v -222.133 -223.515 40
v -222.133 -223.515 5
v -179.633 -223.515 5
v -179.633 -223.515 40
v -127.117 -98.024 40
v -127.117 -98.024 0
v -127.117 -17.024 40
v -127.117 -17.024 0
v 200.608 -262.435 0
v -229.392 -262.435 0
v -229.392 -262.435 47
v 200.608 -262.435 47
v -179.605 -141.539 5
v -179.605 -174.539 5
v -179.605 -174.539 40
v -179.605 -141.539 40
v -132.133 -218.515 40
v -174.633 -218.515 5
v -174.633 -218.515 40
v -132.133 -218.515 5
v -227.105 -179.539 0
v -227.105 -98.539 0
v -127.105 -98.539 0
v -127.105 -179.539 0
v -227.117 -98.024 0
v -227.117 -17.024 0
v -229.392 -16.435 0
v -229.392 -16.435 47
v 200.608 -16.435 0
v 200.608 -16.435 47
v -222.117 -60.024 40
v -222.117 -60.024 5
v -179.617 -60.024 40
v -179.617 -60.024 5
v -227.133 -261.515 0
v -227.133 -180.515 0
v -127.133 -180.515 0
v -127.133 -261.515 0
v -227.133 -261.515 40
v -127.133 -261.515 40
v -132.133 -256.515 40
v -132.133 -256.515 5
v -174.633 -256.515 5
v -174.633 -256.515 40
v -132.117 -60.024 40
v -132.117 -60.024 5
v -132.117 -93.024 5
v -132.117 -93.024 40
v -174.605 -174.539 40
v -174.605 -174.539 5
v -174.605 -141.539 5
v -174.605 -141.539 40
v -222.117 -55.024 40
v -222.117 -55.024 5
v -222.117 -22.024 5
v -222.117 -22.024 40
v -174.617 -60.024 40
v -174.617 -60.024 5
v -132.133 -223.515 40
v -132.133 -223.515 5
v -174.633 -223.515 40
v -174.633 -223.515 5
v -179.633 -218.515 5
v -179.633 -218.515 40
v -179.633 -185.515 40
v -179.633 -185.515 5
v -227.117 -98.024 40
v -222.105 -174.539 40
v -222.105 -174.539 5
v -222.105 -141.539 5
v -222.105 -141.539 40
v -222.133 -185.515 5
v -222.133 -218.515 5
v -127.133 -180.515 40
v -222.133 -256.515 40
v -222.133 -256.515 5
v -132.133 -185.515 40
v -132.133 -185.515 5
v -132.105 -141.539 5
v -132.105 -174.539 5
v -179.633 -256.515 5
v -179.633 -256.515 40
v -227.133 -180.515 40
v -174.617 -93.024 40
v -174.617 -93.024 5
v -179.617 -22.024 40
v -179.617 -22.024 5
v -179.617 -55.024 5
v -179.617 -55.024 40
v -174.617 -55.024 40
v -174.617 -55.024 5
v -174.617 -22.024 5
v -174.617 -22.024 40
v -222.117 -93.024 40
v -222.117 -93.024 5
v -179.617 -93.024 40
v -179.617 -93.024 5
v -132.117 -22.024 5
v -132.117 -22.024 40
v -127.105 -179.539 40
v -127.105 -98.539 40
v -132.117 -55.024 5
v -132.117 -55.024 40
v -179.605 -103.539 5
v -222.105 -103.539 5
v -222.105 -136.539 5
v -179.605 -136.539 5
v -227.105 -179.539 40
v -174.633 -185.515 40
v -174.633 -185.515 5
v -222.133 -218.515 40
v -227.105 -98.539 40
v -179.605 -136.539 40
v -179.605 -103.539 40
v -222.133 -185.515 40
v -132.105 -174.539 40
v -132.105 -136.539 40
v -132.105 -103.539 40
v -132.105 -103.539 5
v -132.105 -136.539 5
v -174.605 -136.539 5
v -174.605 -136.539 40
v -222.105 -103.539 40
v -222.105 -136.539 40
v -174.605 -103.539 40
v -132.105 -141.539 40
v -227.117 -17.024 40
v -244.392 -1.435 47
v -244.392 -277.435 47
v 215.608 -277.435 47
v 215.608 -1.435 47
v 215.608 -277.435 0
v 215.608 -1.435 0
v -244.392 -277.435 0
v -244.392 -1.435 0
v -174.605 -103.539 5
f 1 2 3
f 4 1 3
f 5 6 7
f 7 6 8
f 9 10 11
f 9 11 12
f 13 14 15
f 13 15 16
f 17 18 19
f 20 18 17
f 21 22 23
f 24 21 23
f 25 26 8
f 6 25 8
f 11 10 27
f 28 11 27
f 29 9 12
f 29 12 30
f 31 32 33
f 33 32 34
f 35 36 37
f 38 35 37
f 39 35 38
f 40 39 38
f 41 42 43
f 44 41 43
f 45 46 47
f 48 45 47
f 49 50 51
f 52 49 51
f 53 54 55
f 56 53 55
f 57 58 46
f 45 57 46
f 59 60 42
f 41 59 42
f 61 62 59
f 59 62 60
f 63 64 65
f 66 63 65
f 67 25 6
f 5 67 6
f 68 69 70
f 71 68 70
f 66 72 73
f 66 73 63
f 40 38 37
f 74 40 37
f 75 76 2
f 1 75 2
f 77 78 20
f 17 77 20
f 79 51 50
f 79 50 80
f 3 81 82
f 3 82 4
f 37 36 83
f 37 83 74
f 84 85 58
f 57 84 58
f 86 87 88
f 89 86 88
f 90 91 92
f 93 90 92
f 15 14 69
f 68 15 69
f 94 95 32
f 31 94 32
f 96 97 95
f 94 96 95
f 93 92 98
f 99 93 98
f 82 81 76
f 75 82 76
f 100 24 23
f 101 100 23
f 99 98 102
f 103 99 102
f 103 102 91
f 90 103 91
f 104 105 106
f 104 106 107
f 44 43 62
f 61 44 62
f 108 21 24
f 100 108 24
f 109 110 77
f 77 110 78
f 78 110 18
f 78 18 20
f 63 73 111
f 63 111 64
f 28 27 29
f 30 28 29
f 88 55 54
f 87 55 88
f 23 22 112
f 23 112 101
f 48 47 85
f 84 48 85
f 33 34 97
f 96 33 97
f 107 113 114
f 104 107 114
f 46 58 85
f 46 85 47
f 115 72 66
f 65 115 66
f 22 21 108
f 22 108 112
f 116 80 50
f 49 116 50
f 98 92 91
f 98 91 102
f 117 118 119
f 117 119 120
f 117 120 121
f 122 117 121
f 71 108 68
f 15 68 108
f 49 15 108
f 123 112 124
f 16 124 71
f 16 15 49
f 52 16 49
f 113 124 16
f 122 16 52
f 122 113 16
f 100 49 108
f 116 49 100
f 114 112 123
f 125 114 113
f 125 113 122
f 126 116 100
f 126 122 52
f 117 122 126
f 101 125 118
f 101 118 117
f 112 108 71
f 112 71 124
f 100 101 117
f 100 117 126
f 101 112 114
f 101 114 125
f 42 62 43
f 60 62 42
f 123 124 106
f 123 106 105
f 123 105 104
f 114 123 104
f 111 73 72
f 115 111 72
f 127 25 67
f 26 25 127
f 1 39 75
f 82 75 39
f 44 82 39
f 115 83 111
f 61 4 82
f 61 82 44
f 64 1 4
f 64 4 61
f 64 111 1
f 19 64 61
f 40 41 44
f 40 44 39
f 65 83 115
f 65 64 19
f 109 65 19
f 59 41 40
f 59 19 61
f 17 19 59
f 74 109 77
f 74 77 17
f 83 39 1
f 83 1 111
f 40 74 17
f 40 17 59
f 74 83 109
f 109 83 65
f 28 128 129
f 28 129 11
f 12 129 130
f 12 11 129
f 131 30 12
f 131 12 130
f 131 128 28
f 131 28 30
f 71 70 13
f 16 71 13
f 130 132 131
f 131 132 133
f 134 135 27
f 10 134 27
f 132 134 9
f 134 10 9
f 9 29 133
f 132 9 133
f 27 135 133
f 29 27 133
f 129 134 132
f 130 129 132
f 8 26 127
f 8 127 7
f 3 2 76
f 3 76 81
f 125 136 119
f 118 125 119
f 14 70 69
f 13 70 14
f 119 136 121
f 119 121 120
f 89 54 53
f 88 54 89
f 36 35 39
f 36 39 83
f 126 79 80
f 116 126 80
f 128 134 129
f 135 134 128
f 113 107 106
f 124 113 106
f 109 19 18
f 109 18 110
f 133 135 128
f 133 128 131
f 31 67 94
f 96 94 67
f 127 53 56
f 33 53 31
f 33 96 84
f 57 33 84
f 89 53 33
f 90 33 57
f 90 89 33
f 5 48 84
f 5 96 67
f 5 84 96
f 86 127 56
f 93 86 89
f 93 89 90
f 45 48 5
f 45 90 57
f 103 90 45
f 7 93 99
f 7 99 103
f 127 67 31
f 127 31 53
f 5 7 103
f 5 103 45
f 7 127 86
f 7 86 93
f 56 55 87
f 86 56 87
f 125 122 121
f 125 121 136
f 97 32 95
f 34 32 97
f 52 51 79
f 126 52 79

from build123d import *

# Parameters (mm, degrees)
F0_W      = 459.9999934435
F0_H      = 275.9999934435
F0_W_2    = 430
F0_H_2    = 246
F1_DEPTH  = 47
F2_W      = 100
F2_H      = 81
F2_W_2    = 42.5000048876
F2_H_2    = 5
F2_W_3    = 5
F2_H_3    = 33.0000048876
F3_DEPTH  = 40
F4_DEPTH  = 5
F5_W      = 100
F5_H      = 81
F5_W_2    = 42.5000048876
F5_H_2    = 5
F5_W_3    = 5
F5_H_3    = 33.0000048876
F7_DEPTH  = 40
F8_DEPTH  = 5
F6_W      = 100
F6_H      = 81
F6_W_2    = 42.5000048876
F6_H_2    = 5
F6_W_3    = 5
F6_H_3    = 33.0000048876
F9_DEPTH  = 40
F10_DEPTH = 5


with BuildPart() as f1:
    # F0 (on Top) → F1 (new body)
    with BuildSketch(Plane.XY):
        with Locations((-14.3922492862, -139.4351271806)):
            Rectangle(F0_W, F0_H)
        with Locations((-14.3922492862, -139.4351271806)):
            Rectangle(F0_W_2, F0_H_2, mode=Mode.SUBTRACT)
    extrude(amount=F1_DEPTH)


with BuildPart() as f3:
    # F2 (on Top) → F3 (new body)
    with BuildSketch(Plane.XY):
        with Locations((-177.133394298, -221.0147144079)):
            Rectangle(F2_W, F2_H)
        Polygon((-174.633394298, -185.5147095203), (-132.1333894105, -185.5147095203), (-132.1333894105, -218.5147144079), (-132.1333894105, -223.5147144079), (-132.1333894105, -256.5147192955), (-174.633394298, -256.5147192955), (-179.633394298, -256.5147192955), (-222.1333991856, -256.5147192955), (-222.1333991856, -223.5147144079), (-222.1333991856, -218.5147144079), (-222.1333991856, -185.5147095203), (-179.633394298, -185.5147095203), align=None, mode=Mode.SUBTRACT)
        with Locations((-200.8833967418, -221.0147144079)):
            Rectangle(F2_W_2, F2_H_2)
        with Locations((-153.3833918543, -221.0147144079)):
            Rectangle(F2_W_2, F2_H_2)
        with Locations((-177.133394298, -202.0147119641)):
            Rectangle(F2_W_3, F2_H_3)
        with Locations((-177.133394298, -240.0147168517)):
            Rectangle(F2_W_3, F2_H_3)
        with Locations((-177.133394298, -221.0147144079)):
            Rectangle(F2_W_3, F2_H_2)
    extrude(amount=F3_DEPTH)

    # F2 (on Top) → F4 (join)
    with BuildSketch(Plane.XY):
        with Locations((-153.3833918543, -202.0147119641)):
            Rectangle(F2_W_2, F2_H_3)
        with Locations((-153.3833918543, -240.0147168517)):
            Rectangle(F2_W_2, F2_H_3)
        with Locations((-200.8833967418, -240.0147168517)):
            Rectangle(F2_W_2, F2_H_3)
        with Locations((-200.8833967418, -202.0147119641)):
            Rectangle(F2_W_2, F2_H_3)
    extrude(amount=F4_DEPTH)


with BuildPart() as f7:
    # F5 (on face) → F7 (new body)
    with BuildSketch(Plane.XY):
        with Locations((-177.1052449942, -139.0392463207)):
            Rectangle(F5_W, F5_H)
        Polygon((-174.6052449942, -103.5392414331), (-132.1052401066, -103.5392414331), (-132.1052401066, -136.5392463207), (-132.1052401066, -141.5392463207), (-132.1052401066, -174.5392512083), (-174.6052449942, -174.5392512083), (-179.6052449942, -174.5392512083), (-222.1052498817, -174.5392512083), (-222.1052498817, -141.5392463207), (-222.1052498817, -136.5392463207), (-222.1052498817, -103.5392414331), (-179.6052449942, -103.5392414331), align=None, mode=Mode.SUBTRACT)
        with Locations((-200.855247438, -139.0392463207)):
            Rectangle(F5_W_2, F5_H_2)
        with Locations((-177.1052449942, -139.0392463207)):
            Rectangle(F5_W_3, F5_H_2)
        with Locations((-153.3552425504, -139.0392463207)):
            Rectangle(F5_W_2, F5_H_2)
        with Locations((-177.1052449942, -158.0392487645)):
            Rectangle(F5_W_3, F5_H_3)
        with Locations((-177.1052449942, -120.0392438769)):
            Rectangle(F5_W_3, F5_H_3)
    extrude(amount=F7_DEPTH)

    # F5 (on face) → F8 (join)
    with BuildSketch(Plane.XY):
        with Locations((-200.855247438, -120.0392438769)):
            Rectangle(F5_W_2, F5_H_3)
        with Locations((-200.855247438, -158.0392487645)):
            Rectangle(F5_W_2, F5_H_3)
        with Locations((-153.3552425504, -158.0392487645)):
            Rectangle(F5_W_2, F5_H_3)
        with Locations((-153.3552425504, -120.0392438769)):
            Rectangle(F5_W_2, F5_H_3)
    extrude(amount=F8_DEPTH)


with BuildPart() as f9:
    # F6 (on Top) → F9 (new body)
    with BuildSketch(Plane.XY):
        with Locations((-177.1173298359, -57.5240424871)):
            Rectangle(F6_W, F6_H)
        Polygon((-174.6173298359, -22.0240375996), (-132.1173249483, -22.0240375996), (-132.1173249483, -55.0240424871), (-132.1173249483, -60.0240424871), (-132.1173249483, -93.0240473747), (-174.6173298359, -93.0240473747), (-179.6173298359, -93.0240473747), (-222.1173347235, -93.0240473747), (-222.1173347235, -60.0240424871), (-222.1173347235, -55.0240424871), (-222.1173347235, -22.0240375996), (-179.6173298359, -22.0240375996), align=None, mode=Mode.SUBTRACT)
        with Locations((-153.3673273921, -57.5240424871)):
            Rectangle(F6_W_2, F6_H_2)
        with Locations((-177.1173298359, -57.5240424871)):
            Rectangle(F6_W_3, F6_H_2)
        with Locations((-177.1173298359, -38.5240400434)):
            Rectangle(F6_W_3, F6_H_3)
        with Locations((-177.1173298359, -76.5240449309)):
            Rectangle(F6_W_3, F6_H_3)
        with Locations((-200.8673322797, -57.5240424871)):
            Rectangle(F6_W_2, F6_H_2)
    extrude(amount=F9_DEPTH)

    # F6 (on Top) → F10 (join)
    with BuildSketch(Plane.XY):
        with Locations((-153.3673273921, -76.5240449309)):
            Rectangle(F6_W_2, F6_H_3)
        with Locations((-153.3673273921, -38.5240400434)):
            Rectangle(F6_W_2, F6_H_3)
        with Locations((-200.8673322797, -38.5240400434)):
            Rectangle(F6_W_2, F6_H_3)
        with Locations((-200.8673322797, -76.5240449309)):
            Rectangle(F6_W_2, F6_H_3)
    extrude(amount=F10_DEPTH)


solid = Compound([f1.part, f3.part, f7.part, f9.part])
